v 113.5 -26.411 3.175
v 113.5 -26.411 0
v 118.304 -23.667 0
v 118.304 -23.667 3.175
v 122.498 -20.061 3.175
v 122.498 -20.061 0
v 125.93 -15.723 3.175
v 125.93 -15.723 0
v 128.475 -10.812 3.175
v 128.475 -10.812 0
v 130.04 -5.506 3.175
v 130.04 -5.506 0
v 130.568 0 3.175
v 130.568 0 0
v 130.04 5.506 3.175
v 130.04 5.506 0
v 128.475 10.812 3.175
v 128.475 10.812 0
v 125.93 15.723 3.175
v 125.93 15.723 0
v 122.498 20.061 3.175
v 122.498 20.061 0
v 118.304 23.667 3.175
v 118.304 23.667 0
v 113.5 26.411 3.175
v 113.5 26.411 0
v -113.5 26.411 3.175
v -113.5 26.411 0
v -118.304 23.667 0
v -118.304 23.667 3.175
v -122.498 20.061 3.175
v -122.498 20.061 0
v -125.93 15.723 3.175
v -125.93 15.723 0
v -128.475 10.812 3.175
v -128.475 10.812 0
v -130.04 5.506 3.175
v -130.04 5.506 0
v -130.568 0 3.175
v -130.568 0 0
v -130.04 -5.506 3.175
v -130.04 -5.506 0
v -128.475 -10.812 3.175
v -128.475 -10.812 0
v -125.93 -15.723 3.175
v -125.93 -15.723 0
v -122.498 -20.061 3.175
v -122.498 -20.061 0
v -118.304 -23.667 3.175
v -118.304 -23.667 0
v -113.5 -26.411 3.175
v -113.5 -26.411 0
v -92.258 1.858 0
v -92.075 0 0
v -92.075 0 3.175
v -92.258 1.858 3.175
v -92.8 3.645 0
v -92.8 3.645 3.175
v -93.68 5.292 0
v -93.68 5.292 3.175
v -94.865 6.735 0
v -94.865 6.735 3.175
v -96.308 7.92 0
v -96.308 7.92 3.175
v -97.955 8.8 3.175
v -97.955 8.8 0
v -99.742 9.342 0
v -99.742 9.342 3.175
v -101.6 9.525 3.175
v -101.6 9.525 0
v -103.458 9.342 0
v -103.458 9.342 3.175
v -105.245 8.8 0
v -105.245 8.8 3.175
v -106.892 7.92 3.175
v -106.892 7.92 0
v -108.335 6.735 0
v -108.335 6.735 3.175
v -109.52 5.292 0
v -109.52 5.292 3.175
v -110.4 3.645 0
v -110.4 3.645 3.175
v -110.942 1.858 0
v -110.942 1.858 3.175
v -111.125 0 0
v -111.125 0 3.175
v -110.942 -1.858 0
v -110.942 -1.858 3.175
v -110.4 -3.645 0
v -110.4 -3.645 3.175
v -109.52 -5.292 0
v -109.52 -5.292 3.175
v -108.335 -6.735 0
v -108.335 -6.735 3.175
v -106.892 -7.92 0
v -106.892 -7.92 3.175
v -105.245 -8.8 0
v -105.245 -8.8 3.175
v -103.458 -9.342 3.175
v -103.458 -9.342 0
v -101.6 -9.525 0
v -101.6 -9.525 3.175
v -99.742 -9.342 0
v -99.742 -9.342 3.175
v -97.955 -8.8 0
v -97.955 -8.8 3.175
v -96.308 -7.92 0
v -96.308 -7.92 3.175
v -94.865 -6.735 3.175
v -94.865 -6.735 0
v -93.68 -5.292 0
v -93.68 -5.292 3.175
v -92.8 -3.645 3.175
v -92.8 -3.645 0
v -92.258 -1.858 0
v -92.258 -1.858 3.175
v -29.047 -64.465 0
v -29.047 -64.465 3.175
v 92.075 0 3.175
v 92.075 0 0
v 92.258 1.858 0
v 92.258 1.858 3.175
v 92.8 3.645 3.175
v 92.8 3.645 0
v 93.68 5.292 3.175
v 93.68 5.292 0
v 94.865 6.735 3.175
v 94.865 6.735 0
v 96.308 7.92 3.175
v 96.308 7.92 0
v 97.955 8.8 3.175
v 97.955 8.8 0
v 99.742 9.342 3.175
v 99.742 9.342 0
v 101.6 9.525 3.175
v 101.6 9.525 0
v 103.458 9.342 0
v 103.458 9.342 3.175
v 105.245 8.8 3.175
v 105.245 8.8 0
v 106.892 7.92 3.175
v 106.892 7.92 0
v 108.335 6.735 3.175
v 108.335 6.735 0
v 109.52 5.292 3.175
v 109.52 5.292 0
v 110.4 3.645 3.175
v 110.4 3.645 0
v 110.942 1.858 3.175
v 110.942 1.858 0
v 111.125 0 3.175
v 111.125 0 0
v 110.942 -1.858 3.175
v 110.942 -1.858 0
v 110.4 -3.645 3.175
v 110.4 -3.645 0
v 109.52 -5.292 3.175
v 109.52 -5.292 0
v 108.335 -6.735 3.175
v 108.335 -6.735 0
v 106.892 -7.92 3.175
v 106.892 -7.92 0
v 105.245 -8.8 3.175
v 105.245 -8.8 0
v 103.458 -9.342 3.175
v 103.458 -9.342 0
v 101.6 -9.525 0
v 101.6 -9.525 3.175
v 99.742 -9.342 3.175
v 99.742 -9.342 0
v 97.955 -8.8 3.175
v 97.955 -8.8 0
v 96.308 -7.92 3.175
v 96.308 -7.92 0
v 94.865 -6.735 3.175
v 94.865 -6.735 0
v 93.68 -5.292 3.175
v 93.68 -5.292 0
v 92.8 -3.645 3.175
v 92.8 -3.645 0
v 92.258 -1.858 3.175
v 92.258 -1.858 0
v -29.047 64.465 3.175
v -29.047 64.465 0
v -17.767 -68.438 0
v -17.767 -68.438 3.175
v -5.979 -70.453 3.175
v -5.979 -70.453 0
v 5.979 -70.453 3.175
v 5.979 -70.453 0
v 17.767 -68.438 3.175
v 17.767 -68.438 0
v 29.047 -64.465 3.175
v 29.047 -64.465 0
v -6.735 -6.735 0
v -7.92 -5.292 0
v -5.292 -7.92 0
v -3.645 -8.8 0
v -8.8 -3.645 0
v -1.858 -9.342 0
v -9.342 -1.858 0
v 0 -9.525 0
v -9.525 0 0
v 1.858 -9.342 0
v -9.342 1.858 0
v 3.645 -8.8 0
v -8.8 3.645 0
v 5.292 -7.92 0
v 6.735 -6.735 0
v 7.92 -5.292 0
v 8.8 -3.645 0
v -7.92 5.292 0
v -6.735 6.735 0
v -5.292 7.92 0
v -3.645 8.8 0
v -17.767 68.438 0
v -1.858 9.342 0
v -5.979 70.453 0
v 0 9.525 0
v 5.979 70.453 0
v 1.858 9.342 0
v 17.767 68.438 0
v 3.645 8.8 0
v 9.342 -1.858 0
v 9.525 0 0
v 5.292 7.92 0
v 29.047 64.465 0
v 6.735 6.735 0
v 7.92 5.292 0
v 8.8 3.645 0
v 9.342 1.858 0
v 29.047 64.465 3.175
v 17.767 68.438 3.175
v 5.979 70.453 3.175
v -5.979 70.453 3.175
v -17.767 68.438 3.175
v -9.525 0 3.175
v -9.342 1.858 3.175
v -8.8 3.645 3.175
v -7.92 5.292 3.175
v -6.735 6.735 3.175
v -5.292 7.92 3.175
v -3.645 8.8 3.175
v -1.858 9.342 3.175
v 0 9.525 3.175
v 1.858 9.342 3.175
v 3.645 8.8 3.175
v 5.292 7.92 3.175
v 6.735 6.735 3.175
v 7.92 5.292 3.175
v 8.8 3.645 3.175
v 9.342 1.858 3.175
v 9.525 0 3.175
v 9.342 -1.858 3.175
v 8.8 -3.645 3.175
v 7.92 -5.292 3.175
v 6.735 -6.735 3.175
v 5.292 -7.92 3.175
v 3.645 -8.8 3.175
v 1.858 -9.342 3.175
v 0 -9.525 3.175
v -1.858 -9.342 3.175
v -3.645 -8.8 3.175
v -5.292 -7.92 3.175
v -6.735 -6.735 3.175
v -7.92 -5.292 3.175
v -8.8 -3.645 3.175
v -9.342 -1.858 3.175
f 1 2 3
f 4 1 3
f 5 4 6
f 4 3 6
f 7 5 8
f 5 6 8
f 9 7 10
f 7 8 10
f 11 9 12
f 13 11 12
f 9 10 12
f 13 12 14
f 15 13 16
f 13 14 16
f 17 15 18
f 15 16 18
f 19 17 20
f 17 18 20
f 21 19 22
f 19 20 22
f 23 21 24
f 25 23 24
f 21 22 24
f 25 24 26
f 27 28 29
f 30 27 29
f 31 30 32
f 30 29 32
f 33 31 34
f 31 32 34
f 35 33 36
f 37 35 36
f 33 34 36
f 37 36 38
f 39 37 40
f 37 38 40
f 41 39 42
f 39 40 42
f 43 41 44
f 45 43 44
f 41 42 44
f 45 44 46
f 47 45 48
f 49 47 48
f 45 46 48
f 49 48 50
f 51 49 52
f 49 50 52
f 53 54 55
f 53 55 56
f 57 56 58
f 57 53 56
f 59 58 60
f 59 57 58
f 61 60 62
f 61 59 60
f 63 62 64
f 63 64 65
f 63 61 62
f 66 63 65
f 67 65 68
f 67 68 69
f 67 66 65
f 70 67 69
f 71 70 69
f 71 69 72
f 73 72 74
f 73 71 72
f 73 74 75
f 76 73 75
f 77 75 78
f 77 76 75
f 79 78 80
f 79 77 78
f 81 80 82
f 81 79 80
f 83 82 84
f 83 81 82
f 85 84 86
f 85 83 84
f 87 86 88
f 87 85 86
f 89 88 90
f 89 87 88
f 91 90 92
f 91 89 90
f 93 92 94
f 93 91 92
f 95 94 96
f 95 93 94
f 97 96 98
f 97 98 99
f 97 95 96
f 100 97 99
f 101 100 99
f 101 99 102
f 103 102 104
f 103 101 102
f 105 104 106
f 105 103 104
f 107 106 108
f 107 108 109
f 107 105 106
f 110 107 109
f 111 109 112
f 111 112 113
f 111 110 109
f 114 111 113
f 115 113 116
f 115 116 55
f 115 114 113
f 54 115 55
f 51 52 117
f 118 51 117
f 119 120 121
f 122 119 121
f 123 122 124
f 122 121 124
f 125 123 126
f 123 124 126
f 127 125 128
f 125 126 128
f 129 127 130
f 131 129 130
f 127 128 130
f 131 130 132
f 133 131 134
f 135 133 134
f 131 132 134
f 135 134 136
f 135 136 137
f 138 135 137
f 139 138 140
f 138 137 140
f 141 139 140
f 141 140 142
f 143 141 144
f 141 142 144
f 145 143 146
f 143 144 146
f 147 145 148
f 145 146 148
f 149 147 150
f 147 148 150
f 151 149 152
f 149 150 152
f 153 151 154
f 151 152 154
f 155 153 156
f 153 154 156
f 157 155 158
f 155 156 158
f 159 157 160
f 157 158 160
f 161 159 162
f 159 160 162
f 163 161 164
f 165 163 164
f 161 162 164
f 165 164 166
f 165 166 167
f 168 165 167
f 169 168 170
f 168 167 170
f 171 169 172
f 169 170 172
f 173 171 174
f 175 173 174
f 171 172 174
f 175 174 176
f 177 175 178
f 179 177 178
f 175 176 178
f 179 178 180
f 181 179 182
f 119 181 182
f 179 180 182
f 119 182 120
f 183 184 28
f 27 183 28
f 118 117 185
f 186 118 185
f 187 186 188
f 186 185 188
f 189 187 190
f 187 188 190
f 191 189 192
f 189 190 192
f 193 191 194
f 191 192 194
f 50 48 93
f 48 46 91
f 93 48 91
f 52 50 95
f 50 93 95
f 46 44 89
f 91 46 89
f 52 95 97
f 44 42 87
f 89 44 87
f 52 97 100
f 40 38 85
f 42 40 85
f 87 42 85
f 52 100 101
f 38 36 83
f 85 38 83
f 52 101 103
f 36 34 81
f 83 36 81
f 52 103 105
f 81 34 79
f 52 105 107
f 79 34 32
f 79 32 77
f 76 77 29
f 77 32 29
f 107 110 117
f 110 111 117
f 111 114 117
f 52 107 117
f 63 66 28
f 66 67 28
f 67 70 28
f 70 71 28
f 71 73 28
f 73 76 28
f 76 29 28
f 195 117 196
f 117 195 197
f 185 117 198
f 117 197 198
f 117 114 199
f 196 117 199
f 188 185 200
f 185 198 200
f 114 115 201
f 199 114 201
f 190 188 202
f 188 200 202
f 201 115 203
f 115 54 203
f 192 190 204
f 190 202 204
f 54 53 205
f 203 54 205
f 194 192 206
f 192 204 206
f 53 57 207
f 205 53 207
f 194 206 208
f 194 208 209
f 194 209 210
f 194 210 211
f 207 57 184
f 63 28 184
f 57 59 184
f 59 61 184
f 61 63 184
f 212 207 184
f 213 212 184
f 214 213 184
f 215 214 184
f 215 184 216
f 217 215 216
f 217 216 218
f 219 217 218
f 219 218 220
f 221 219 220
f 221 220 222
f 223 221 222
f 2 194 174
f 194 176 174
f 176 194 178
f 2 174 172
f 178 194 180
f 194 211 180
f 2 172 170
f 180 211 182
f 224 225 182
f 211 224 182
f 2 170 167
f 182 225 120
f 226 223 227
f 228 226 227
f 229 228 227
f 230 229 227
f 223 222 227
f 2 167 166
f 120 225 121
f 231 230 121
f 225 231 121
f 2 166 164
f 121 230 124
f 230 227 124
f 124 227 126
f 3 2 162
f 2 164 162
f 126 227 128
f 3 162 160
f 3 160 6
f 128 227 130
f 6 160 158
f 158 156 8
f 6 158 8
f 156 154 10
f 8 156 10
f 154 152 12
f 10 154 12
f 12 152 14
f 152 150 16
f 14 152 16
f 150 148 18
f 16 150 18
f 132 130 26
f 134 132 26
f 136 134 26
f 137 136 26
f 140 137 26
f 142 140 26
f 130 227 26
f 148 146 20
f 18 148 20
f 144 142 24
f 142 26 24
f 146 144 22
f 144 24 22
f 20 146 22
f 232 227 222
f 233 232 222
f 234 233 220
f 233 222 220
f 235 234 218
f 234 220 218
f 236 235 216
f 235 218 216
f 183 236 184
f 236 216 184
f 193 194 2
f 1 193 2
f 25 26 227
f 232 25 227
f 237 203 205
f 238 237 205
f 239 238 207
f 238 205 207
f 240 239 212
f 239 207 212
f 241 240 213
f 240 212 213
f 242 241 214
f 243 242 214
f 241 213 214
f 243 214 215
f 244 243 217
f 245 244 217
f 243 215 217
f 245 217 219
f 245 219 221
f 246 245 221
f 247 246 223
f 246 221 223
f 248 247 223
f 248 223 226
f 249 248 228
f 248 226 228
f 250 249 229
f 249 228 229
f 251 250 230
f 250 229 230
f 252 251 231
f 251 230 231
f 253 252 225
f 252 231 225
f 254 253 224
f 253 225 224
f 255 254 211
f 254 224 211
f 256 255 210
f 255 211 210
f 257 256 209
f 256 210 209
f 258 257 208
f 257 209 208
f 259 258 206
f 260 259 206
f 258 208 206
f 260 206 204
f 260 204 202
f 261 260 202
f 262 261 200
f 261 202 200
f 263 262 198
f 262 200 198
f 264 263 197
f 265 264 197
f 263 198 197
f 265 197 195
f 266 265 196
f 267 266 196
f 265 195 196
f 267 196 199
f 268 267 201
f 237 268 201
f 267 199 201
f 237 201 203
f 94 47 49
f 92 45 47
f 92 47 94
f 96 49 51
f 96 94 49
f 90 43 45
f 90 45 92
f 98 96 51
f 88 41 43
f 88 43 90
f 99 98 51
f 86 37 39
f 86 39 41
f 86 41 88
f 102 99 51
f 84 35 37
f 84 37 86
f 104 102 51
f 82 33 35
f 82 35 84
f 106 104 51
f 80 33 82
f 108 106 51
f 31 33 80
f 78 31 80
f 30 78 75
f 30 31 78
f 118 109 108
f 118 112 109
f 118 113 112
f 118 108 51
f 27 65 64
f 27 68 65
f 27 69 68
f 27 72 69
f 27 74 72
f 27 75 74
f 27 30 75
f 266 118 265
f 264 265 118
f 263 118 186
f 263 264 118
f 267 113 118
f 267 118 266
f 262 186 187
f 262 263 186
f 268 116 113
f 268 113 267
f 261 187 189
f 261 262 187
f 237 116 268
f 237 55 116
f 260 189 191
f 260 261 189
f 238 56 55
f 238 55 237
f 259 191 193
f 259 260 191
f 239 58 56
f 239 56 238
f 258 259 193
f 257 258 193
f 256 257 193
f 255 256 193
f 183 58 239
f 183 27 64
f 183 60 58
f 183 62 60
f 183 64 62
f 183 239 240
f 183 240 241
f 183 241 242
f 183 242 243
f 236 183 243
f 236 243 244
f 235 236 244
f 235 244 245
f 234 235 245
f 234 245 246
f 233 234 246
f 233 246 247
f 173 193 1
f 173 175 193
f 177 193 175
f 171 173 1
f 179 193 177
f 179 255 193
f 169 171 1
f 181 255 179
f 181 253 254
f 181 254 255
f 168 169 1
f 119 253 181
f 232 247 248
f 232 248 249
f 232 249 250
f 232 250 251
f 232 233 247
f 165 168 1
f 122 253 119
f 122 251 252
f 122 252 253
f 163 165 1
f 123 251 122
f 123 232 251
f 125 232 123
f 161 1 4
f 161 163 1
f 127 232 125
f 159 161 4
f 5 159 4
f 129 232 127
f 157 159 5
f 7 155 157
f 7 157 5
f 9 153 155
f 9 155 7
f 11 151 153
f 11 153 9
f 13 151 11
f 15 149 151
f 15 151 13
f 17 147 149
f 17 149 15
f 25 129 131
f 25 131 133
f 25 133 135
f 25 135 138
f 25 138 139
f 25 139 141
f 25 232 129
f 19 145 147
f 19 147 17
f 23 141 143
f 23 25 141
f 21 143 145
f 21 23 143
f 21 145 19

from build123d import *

# Parameters (mm, degrees)
F0_R     = 13.9065
F0_R_2   = 9.525
F1_DEPTH = 3.175


# Not quite as in the source:
# - a length typed as a fraction of an inch, garbled in the dataset ("3 / 203.2 mm" for 3/8 in), is restored


with BuildPart() as f1:
    # F0 (on Top) → F1 (new body)
    with BuildSketch(Plane.XY):
        with BuildLine():
            Line((70.7064372, 0), (64.77, 0))
            ThreePointArc((64.77, 0), (0, -64.77), (-64.77, 0))
            Line((-64.77, 0), (-70.7064372, 0))
            ThreePointArc((-70.7064372, 0), (-59.3851891605, -38.3770708873), (-29.0468761129, -64.4645580889))
            ThreePointArc((-29.0468761129, -64.4645580889), (0, -70.7064372), (29.0468761129, -64.4645580889))
            ThreePointArc((29.0468761129, -64.4645580889), (59.3851891605, -38.3770708873), (70.7064372, 0))
        make_face()
        with BuildLine():
            ThreePointArc((-64.77, 0), (0, 64.77), (64.77, 0))
            Line((64.77, 0), (70.7064372, 0))
            ThreePointArc((70.7064372, 0), (59.3851891605, 38.3770708873), (29.0468761129, 64.4645580889))
            ThreePointArc((29.0468761129, 64.4645580889), (0, 70.7064372), (-29.0468761129, 64.4645580889))
            ThreePointArc((-29.0468761129, 64.4645580889), (-59.3851891605, 38.3770708873), (-70.7064372, 0))
            Line((-70.7064372, 0), (-64.77, 0))
        make_face()
        with BuildLine():
            Line((72.631808, 0), (70.7064372, 0))
            ThreePointArc((70.7064372, 0), (59.3851891605, -38.3770708873), (29.0468761129, -64.4645580889))
            Line((29.0468761129, -64.4645580889), (113.5004084714, -26.410914902))
            ThreePointArc((113.5004084714, -26.410914902), (85.8770417817, -24.3299143569), (72.631808, 0))
        make_face()
        with BuildLine():
            ThreePointArc((29.0468761129, 64.4645580889), (59.3851891605, 38.3770708873), (70.7064372, 0))
            Line((70.7064372, 0), (72.631808, 0))
            ThreePointArc((72.631808, 0), (85.8770417817, 24.3299143569), (113.5004084714, 26.410914902))
            Line((113.5004084714, 26.410914902), (29.0468761129, 64.4645580889))
        make_face()
        with BuildLine():
            Line((-72.631808, 0), (-70.7064372, 0))
            ThreePointArc((-70.7064372, 0), (-59.3851891605, 38.3770708873), (-29.0468761129, 64.4645580889))
            Line((-29.0468761129, 64.4645580889), (-113.5004084714, 26.410914902))
            ThreePointArc((-113.5004084714, 26.410914902), (-85.8770417817, 24.3299143569), (-72.631808, 0))
        make_face()
        with BuildLine():
            ThreePointArc((-29.0468761129, -64.4645580889), (-59.3851891605, -38.3770708873), (-70.7064372, 0))
            Line((-70.7064372, 0), (-72.631808, 0))
            ThreePointArc((-72.631808, 0), (-85.8770417817, -24.3299143569), (-113.5004084714, -26.410914902))
            Line((-113.5004084714, -26.410914902), (-29.0468761129, -64.4645580889))
        make_face()
        with BuildLine():
            ThreePointArc((113.5004084714, 26.410914902), (85.8770417817, 24.3299143569), (72.631808, 0))
            ThreePointArc((72.631808, 0), (85.8770417817, -24.3299143569), (113.5004084714, -26.410914902))
            ThreePointArc((113.5004084714, -26.410914902), (125.9299143569, -15.7229582183), (130.568192, 0))
            ThreePointArc((130.568192, 0), (125.9299143569, 15.7229582183), (113.5004084714, 26.410914902))
        make_face()
        with BuildLine():
            ThreePointArc((115.5065, 0), (101.6, -13.9065), (87.6935, 0))
            ThreePointArc((87.6935, 0), (101.6, 13.9065), (115.5065, 0))
        make_face(mode=Mode.SUBTRACT)
        with BuildLine():
            ThreePointArc((-113.5004084714, -26.410914902), (-85.8770417817, -24.3299143569), (-72.631808, 0))
            ThreePointArc((-72.631808, 0), (-85.8770417817, 24.3299143569), (-113.5004084714, 26.410914902))
            ThreePointArc((-113.5004084714, 26.410914902), (-130.568192, 0), (-113.5004084714, -26.410914902))
        make_face()
        with Locations((-101.6, 0)):
            Circle(F0_R, mode=Mode.SUBTRACT)
        with BuildLine():
            ThreePointArc((-64.77, 0), (0, -64.77), (64.77, 0))
            Line((64.77, 0), (9.525, 0))
            ThreePointArc((9.525, 0), (0, -9.525), (-9.525, 0))
            Line((-9.525, 0), (-64.77, 0))
        make_face()
        with BuildLine():
            Line((9.525, 0), (64.77, 0))
            ThreePointArc((64.77, 0), (0, 64.77), (-64.77, 0))
            Line((-64.77, 0), (-9.525, 0))
            ThreePointArc((-9.525, 0), (0, 9.525), (9.525, 0))
        make_face()
        with BuildLine():
            ThreePointArc((115.5065, 0), (101.6, 13.9065), (87.6935, 0))
            ThreePointArc((87.6935, 0), (101.6, -13.9065), (115.5065, 0))
        make_face()
        with BuildLine():
            ThreePointArc((111.125, 0), (101.6, -9.525), (92.075, 0))
            ThreePointArc((92.075, 0), (101.6, 9.525), (111.125, 0))
        make_face(mode=Mode.SUBTRACT)
        with Locations((-101.6, 0)):
            Circle(F0_R)
        with Locations((-101.6, 0)):
            Circle(F0_R_2, mode=Mode.SUBTRACT)
    extrude(amount=F1_DEPTH)


solid = f1.part
